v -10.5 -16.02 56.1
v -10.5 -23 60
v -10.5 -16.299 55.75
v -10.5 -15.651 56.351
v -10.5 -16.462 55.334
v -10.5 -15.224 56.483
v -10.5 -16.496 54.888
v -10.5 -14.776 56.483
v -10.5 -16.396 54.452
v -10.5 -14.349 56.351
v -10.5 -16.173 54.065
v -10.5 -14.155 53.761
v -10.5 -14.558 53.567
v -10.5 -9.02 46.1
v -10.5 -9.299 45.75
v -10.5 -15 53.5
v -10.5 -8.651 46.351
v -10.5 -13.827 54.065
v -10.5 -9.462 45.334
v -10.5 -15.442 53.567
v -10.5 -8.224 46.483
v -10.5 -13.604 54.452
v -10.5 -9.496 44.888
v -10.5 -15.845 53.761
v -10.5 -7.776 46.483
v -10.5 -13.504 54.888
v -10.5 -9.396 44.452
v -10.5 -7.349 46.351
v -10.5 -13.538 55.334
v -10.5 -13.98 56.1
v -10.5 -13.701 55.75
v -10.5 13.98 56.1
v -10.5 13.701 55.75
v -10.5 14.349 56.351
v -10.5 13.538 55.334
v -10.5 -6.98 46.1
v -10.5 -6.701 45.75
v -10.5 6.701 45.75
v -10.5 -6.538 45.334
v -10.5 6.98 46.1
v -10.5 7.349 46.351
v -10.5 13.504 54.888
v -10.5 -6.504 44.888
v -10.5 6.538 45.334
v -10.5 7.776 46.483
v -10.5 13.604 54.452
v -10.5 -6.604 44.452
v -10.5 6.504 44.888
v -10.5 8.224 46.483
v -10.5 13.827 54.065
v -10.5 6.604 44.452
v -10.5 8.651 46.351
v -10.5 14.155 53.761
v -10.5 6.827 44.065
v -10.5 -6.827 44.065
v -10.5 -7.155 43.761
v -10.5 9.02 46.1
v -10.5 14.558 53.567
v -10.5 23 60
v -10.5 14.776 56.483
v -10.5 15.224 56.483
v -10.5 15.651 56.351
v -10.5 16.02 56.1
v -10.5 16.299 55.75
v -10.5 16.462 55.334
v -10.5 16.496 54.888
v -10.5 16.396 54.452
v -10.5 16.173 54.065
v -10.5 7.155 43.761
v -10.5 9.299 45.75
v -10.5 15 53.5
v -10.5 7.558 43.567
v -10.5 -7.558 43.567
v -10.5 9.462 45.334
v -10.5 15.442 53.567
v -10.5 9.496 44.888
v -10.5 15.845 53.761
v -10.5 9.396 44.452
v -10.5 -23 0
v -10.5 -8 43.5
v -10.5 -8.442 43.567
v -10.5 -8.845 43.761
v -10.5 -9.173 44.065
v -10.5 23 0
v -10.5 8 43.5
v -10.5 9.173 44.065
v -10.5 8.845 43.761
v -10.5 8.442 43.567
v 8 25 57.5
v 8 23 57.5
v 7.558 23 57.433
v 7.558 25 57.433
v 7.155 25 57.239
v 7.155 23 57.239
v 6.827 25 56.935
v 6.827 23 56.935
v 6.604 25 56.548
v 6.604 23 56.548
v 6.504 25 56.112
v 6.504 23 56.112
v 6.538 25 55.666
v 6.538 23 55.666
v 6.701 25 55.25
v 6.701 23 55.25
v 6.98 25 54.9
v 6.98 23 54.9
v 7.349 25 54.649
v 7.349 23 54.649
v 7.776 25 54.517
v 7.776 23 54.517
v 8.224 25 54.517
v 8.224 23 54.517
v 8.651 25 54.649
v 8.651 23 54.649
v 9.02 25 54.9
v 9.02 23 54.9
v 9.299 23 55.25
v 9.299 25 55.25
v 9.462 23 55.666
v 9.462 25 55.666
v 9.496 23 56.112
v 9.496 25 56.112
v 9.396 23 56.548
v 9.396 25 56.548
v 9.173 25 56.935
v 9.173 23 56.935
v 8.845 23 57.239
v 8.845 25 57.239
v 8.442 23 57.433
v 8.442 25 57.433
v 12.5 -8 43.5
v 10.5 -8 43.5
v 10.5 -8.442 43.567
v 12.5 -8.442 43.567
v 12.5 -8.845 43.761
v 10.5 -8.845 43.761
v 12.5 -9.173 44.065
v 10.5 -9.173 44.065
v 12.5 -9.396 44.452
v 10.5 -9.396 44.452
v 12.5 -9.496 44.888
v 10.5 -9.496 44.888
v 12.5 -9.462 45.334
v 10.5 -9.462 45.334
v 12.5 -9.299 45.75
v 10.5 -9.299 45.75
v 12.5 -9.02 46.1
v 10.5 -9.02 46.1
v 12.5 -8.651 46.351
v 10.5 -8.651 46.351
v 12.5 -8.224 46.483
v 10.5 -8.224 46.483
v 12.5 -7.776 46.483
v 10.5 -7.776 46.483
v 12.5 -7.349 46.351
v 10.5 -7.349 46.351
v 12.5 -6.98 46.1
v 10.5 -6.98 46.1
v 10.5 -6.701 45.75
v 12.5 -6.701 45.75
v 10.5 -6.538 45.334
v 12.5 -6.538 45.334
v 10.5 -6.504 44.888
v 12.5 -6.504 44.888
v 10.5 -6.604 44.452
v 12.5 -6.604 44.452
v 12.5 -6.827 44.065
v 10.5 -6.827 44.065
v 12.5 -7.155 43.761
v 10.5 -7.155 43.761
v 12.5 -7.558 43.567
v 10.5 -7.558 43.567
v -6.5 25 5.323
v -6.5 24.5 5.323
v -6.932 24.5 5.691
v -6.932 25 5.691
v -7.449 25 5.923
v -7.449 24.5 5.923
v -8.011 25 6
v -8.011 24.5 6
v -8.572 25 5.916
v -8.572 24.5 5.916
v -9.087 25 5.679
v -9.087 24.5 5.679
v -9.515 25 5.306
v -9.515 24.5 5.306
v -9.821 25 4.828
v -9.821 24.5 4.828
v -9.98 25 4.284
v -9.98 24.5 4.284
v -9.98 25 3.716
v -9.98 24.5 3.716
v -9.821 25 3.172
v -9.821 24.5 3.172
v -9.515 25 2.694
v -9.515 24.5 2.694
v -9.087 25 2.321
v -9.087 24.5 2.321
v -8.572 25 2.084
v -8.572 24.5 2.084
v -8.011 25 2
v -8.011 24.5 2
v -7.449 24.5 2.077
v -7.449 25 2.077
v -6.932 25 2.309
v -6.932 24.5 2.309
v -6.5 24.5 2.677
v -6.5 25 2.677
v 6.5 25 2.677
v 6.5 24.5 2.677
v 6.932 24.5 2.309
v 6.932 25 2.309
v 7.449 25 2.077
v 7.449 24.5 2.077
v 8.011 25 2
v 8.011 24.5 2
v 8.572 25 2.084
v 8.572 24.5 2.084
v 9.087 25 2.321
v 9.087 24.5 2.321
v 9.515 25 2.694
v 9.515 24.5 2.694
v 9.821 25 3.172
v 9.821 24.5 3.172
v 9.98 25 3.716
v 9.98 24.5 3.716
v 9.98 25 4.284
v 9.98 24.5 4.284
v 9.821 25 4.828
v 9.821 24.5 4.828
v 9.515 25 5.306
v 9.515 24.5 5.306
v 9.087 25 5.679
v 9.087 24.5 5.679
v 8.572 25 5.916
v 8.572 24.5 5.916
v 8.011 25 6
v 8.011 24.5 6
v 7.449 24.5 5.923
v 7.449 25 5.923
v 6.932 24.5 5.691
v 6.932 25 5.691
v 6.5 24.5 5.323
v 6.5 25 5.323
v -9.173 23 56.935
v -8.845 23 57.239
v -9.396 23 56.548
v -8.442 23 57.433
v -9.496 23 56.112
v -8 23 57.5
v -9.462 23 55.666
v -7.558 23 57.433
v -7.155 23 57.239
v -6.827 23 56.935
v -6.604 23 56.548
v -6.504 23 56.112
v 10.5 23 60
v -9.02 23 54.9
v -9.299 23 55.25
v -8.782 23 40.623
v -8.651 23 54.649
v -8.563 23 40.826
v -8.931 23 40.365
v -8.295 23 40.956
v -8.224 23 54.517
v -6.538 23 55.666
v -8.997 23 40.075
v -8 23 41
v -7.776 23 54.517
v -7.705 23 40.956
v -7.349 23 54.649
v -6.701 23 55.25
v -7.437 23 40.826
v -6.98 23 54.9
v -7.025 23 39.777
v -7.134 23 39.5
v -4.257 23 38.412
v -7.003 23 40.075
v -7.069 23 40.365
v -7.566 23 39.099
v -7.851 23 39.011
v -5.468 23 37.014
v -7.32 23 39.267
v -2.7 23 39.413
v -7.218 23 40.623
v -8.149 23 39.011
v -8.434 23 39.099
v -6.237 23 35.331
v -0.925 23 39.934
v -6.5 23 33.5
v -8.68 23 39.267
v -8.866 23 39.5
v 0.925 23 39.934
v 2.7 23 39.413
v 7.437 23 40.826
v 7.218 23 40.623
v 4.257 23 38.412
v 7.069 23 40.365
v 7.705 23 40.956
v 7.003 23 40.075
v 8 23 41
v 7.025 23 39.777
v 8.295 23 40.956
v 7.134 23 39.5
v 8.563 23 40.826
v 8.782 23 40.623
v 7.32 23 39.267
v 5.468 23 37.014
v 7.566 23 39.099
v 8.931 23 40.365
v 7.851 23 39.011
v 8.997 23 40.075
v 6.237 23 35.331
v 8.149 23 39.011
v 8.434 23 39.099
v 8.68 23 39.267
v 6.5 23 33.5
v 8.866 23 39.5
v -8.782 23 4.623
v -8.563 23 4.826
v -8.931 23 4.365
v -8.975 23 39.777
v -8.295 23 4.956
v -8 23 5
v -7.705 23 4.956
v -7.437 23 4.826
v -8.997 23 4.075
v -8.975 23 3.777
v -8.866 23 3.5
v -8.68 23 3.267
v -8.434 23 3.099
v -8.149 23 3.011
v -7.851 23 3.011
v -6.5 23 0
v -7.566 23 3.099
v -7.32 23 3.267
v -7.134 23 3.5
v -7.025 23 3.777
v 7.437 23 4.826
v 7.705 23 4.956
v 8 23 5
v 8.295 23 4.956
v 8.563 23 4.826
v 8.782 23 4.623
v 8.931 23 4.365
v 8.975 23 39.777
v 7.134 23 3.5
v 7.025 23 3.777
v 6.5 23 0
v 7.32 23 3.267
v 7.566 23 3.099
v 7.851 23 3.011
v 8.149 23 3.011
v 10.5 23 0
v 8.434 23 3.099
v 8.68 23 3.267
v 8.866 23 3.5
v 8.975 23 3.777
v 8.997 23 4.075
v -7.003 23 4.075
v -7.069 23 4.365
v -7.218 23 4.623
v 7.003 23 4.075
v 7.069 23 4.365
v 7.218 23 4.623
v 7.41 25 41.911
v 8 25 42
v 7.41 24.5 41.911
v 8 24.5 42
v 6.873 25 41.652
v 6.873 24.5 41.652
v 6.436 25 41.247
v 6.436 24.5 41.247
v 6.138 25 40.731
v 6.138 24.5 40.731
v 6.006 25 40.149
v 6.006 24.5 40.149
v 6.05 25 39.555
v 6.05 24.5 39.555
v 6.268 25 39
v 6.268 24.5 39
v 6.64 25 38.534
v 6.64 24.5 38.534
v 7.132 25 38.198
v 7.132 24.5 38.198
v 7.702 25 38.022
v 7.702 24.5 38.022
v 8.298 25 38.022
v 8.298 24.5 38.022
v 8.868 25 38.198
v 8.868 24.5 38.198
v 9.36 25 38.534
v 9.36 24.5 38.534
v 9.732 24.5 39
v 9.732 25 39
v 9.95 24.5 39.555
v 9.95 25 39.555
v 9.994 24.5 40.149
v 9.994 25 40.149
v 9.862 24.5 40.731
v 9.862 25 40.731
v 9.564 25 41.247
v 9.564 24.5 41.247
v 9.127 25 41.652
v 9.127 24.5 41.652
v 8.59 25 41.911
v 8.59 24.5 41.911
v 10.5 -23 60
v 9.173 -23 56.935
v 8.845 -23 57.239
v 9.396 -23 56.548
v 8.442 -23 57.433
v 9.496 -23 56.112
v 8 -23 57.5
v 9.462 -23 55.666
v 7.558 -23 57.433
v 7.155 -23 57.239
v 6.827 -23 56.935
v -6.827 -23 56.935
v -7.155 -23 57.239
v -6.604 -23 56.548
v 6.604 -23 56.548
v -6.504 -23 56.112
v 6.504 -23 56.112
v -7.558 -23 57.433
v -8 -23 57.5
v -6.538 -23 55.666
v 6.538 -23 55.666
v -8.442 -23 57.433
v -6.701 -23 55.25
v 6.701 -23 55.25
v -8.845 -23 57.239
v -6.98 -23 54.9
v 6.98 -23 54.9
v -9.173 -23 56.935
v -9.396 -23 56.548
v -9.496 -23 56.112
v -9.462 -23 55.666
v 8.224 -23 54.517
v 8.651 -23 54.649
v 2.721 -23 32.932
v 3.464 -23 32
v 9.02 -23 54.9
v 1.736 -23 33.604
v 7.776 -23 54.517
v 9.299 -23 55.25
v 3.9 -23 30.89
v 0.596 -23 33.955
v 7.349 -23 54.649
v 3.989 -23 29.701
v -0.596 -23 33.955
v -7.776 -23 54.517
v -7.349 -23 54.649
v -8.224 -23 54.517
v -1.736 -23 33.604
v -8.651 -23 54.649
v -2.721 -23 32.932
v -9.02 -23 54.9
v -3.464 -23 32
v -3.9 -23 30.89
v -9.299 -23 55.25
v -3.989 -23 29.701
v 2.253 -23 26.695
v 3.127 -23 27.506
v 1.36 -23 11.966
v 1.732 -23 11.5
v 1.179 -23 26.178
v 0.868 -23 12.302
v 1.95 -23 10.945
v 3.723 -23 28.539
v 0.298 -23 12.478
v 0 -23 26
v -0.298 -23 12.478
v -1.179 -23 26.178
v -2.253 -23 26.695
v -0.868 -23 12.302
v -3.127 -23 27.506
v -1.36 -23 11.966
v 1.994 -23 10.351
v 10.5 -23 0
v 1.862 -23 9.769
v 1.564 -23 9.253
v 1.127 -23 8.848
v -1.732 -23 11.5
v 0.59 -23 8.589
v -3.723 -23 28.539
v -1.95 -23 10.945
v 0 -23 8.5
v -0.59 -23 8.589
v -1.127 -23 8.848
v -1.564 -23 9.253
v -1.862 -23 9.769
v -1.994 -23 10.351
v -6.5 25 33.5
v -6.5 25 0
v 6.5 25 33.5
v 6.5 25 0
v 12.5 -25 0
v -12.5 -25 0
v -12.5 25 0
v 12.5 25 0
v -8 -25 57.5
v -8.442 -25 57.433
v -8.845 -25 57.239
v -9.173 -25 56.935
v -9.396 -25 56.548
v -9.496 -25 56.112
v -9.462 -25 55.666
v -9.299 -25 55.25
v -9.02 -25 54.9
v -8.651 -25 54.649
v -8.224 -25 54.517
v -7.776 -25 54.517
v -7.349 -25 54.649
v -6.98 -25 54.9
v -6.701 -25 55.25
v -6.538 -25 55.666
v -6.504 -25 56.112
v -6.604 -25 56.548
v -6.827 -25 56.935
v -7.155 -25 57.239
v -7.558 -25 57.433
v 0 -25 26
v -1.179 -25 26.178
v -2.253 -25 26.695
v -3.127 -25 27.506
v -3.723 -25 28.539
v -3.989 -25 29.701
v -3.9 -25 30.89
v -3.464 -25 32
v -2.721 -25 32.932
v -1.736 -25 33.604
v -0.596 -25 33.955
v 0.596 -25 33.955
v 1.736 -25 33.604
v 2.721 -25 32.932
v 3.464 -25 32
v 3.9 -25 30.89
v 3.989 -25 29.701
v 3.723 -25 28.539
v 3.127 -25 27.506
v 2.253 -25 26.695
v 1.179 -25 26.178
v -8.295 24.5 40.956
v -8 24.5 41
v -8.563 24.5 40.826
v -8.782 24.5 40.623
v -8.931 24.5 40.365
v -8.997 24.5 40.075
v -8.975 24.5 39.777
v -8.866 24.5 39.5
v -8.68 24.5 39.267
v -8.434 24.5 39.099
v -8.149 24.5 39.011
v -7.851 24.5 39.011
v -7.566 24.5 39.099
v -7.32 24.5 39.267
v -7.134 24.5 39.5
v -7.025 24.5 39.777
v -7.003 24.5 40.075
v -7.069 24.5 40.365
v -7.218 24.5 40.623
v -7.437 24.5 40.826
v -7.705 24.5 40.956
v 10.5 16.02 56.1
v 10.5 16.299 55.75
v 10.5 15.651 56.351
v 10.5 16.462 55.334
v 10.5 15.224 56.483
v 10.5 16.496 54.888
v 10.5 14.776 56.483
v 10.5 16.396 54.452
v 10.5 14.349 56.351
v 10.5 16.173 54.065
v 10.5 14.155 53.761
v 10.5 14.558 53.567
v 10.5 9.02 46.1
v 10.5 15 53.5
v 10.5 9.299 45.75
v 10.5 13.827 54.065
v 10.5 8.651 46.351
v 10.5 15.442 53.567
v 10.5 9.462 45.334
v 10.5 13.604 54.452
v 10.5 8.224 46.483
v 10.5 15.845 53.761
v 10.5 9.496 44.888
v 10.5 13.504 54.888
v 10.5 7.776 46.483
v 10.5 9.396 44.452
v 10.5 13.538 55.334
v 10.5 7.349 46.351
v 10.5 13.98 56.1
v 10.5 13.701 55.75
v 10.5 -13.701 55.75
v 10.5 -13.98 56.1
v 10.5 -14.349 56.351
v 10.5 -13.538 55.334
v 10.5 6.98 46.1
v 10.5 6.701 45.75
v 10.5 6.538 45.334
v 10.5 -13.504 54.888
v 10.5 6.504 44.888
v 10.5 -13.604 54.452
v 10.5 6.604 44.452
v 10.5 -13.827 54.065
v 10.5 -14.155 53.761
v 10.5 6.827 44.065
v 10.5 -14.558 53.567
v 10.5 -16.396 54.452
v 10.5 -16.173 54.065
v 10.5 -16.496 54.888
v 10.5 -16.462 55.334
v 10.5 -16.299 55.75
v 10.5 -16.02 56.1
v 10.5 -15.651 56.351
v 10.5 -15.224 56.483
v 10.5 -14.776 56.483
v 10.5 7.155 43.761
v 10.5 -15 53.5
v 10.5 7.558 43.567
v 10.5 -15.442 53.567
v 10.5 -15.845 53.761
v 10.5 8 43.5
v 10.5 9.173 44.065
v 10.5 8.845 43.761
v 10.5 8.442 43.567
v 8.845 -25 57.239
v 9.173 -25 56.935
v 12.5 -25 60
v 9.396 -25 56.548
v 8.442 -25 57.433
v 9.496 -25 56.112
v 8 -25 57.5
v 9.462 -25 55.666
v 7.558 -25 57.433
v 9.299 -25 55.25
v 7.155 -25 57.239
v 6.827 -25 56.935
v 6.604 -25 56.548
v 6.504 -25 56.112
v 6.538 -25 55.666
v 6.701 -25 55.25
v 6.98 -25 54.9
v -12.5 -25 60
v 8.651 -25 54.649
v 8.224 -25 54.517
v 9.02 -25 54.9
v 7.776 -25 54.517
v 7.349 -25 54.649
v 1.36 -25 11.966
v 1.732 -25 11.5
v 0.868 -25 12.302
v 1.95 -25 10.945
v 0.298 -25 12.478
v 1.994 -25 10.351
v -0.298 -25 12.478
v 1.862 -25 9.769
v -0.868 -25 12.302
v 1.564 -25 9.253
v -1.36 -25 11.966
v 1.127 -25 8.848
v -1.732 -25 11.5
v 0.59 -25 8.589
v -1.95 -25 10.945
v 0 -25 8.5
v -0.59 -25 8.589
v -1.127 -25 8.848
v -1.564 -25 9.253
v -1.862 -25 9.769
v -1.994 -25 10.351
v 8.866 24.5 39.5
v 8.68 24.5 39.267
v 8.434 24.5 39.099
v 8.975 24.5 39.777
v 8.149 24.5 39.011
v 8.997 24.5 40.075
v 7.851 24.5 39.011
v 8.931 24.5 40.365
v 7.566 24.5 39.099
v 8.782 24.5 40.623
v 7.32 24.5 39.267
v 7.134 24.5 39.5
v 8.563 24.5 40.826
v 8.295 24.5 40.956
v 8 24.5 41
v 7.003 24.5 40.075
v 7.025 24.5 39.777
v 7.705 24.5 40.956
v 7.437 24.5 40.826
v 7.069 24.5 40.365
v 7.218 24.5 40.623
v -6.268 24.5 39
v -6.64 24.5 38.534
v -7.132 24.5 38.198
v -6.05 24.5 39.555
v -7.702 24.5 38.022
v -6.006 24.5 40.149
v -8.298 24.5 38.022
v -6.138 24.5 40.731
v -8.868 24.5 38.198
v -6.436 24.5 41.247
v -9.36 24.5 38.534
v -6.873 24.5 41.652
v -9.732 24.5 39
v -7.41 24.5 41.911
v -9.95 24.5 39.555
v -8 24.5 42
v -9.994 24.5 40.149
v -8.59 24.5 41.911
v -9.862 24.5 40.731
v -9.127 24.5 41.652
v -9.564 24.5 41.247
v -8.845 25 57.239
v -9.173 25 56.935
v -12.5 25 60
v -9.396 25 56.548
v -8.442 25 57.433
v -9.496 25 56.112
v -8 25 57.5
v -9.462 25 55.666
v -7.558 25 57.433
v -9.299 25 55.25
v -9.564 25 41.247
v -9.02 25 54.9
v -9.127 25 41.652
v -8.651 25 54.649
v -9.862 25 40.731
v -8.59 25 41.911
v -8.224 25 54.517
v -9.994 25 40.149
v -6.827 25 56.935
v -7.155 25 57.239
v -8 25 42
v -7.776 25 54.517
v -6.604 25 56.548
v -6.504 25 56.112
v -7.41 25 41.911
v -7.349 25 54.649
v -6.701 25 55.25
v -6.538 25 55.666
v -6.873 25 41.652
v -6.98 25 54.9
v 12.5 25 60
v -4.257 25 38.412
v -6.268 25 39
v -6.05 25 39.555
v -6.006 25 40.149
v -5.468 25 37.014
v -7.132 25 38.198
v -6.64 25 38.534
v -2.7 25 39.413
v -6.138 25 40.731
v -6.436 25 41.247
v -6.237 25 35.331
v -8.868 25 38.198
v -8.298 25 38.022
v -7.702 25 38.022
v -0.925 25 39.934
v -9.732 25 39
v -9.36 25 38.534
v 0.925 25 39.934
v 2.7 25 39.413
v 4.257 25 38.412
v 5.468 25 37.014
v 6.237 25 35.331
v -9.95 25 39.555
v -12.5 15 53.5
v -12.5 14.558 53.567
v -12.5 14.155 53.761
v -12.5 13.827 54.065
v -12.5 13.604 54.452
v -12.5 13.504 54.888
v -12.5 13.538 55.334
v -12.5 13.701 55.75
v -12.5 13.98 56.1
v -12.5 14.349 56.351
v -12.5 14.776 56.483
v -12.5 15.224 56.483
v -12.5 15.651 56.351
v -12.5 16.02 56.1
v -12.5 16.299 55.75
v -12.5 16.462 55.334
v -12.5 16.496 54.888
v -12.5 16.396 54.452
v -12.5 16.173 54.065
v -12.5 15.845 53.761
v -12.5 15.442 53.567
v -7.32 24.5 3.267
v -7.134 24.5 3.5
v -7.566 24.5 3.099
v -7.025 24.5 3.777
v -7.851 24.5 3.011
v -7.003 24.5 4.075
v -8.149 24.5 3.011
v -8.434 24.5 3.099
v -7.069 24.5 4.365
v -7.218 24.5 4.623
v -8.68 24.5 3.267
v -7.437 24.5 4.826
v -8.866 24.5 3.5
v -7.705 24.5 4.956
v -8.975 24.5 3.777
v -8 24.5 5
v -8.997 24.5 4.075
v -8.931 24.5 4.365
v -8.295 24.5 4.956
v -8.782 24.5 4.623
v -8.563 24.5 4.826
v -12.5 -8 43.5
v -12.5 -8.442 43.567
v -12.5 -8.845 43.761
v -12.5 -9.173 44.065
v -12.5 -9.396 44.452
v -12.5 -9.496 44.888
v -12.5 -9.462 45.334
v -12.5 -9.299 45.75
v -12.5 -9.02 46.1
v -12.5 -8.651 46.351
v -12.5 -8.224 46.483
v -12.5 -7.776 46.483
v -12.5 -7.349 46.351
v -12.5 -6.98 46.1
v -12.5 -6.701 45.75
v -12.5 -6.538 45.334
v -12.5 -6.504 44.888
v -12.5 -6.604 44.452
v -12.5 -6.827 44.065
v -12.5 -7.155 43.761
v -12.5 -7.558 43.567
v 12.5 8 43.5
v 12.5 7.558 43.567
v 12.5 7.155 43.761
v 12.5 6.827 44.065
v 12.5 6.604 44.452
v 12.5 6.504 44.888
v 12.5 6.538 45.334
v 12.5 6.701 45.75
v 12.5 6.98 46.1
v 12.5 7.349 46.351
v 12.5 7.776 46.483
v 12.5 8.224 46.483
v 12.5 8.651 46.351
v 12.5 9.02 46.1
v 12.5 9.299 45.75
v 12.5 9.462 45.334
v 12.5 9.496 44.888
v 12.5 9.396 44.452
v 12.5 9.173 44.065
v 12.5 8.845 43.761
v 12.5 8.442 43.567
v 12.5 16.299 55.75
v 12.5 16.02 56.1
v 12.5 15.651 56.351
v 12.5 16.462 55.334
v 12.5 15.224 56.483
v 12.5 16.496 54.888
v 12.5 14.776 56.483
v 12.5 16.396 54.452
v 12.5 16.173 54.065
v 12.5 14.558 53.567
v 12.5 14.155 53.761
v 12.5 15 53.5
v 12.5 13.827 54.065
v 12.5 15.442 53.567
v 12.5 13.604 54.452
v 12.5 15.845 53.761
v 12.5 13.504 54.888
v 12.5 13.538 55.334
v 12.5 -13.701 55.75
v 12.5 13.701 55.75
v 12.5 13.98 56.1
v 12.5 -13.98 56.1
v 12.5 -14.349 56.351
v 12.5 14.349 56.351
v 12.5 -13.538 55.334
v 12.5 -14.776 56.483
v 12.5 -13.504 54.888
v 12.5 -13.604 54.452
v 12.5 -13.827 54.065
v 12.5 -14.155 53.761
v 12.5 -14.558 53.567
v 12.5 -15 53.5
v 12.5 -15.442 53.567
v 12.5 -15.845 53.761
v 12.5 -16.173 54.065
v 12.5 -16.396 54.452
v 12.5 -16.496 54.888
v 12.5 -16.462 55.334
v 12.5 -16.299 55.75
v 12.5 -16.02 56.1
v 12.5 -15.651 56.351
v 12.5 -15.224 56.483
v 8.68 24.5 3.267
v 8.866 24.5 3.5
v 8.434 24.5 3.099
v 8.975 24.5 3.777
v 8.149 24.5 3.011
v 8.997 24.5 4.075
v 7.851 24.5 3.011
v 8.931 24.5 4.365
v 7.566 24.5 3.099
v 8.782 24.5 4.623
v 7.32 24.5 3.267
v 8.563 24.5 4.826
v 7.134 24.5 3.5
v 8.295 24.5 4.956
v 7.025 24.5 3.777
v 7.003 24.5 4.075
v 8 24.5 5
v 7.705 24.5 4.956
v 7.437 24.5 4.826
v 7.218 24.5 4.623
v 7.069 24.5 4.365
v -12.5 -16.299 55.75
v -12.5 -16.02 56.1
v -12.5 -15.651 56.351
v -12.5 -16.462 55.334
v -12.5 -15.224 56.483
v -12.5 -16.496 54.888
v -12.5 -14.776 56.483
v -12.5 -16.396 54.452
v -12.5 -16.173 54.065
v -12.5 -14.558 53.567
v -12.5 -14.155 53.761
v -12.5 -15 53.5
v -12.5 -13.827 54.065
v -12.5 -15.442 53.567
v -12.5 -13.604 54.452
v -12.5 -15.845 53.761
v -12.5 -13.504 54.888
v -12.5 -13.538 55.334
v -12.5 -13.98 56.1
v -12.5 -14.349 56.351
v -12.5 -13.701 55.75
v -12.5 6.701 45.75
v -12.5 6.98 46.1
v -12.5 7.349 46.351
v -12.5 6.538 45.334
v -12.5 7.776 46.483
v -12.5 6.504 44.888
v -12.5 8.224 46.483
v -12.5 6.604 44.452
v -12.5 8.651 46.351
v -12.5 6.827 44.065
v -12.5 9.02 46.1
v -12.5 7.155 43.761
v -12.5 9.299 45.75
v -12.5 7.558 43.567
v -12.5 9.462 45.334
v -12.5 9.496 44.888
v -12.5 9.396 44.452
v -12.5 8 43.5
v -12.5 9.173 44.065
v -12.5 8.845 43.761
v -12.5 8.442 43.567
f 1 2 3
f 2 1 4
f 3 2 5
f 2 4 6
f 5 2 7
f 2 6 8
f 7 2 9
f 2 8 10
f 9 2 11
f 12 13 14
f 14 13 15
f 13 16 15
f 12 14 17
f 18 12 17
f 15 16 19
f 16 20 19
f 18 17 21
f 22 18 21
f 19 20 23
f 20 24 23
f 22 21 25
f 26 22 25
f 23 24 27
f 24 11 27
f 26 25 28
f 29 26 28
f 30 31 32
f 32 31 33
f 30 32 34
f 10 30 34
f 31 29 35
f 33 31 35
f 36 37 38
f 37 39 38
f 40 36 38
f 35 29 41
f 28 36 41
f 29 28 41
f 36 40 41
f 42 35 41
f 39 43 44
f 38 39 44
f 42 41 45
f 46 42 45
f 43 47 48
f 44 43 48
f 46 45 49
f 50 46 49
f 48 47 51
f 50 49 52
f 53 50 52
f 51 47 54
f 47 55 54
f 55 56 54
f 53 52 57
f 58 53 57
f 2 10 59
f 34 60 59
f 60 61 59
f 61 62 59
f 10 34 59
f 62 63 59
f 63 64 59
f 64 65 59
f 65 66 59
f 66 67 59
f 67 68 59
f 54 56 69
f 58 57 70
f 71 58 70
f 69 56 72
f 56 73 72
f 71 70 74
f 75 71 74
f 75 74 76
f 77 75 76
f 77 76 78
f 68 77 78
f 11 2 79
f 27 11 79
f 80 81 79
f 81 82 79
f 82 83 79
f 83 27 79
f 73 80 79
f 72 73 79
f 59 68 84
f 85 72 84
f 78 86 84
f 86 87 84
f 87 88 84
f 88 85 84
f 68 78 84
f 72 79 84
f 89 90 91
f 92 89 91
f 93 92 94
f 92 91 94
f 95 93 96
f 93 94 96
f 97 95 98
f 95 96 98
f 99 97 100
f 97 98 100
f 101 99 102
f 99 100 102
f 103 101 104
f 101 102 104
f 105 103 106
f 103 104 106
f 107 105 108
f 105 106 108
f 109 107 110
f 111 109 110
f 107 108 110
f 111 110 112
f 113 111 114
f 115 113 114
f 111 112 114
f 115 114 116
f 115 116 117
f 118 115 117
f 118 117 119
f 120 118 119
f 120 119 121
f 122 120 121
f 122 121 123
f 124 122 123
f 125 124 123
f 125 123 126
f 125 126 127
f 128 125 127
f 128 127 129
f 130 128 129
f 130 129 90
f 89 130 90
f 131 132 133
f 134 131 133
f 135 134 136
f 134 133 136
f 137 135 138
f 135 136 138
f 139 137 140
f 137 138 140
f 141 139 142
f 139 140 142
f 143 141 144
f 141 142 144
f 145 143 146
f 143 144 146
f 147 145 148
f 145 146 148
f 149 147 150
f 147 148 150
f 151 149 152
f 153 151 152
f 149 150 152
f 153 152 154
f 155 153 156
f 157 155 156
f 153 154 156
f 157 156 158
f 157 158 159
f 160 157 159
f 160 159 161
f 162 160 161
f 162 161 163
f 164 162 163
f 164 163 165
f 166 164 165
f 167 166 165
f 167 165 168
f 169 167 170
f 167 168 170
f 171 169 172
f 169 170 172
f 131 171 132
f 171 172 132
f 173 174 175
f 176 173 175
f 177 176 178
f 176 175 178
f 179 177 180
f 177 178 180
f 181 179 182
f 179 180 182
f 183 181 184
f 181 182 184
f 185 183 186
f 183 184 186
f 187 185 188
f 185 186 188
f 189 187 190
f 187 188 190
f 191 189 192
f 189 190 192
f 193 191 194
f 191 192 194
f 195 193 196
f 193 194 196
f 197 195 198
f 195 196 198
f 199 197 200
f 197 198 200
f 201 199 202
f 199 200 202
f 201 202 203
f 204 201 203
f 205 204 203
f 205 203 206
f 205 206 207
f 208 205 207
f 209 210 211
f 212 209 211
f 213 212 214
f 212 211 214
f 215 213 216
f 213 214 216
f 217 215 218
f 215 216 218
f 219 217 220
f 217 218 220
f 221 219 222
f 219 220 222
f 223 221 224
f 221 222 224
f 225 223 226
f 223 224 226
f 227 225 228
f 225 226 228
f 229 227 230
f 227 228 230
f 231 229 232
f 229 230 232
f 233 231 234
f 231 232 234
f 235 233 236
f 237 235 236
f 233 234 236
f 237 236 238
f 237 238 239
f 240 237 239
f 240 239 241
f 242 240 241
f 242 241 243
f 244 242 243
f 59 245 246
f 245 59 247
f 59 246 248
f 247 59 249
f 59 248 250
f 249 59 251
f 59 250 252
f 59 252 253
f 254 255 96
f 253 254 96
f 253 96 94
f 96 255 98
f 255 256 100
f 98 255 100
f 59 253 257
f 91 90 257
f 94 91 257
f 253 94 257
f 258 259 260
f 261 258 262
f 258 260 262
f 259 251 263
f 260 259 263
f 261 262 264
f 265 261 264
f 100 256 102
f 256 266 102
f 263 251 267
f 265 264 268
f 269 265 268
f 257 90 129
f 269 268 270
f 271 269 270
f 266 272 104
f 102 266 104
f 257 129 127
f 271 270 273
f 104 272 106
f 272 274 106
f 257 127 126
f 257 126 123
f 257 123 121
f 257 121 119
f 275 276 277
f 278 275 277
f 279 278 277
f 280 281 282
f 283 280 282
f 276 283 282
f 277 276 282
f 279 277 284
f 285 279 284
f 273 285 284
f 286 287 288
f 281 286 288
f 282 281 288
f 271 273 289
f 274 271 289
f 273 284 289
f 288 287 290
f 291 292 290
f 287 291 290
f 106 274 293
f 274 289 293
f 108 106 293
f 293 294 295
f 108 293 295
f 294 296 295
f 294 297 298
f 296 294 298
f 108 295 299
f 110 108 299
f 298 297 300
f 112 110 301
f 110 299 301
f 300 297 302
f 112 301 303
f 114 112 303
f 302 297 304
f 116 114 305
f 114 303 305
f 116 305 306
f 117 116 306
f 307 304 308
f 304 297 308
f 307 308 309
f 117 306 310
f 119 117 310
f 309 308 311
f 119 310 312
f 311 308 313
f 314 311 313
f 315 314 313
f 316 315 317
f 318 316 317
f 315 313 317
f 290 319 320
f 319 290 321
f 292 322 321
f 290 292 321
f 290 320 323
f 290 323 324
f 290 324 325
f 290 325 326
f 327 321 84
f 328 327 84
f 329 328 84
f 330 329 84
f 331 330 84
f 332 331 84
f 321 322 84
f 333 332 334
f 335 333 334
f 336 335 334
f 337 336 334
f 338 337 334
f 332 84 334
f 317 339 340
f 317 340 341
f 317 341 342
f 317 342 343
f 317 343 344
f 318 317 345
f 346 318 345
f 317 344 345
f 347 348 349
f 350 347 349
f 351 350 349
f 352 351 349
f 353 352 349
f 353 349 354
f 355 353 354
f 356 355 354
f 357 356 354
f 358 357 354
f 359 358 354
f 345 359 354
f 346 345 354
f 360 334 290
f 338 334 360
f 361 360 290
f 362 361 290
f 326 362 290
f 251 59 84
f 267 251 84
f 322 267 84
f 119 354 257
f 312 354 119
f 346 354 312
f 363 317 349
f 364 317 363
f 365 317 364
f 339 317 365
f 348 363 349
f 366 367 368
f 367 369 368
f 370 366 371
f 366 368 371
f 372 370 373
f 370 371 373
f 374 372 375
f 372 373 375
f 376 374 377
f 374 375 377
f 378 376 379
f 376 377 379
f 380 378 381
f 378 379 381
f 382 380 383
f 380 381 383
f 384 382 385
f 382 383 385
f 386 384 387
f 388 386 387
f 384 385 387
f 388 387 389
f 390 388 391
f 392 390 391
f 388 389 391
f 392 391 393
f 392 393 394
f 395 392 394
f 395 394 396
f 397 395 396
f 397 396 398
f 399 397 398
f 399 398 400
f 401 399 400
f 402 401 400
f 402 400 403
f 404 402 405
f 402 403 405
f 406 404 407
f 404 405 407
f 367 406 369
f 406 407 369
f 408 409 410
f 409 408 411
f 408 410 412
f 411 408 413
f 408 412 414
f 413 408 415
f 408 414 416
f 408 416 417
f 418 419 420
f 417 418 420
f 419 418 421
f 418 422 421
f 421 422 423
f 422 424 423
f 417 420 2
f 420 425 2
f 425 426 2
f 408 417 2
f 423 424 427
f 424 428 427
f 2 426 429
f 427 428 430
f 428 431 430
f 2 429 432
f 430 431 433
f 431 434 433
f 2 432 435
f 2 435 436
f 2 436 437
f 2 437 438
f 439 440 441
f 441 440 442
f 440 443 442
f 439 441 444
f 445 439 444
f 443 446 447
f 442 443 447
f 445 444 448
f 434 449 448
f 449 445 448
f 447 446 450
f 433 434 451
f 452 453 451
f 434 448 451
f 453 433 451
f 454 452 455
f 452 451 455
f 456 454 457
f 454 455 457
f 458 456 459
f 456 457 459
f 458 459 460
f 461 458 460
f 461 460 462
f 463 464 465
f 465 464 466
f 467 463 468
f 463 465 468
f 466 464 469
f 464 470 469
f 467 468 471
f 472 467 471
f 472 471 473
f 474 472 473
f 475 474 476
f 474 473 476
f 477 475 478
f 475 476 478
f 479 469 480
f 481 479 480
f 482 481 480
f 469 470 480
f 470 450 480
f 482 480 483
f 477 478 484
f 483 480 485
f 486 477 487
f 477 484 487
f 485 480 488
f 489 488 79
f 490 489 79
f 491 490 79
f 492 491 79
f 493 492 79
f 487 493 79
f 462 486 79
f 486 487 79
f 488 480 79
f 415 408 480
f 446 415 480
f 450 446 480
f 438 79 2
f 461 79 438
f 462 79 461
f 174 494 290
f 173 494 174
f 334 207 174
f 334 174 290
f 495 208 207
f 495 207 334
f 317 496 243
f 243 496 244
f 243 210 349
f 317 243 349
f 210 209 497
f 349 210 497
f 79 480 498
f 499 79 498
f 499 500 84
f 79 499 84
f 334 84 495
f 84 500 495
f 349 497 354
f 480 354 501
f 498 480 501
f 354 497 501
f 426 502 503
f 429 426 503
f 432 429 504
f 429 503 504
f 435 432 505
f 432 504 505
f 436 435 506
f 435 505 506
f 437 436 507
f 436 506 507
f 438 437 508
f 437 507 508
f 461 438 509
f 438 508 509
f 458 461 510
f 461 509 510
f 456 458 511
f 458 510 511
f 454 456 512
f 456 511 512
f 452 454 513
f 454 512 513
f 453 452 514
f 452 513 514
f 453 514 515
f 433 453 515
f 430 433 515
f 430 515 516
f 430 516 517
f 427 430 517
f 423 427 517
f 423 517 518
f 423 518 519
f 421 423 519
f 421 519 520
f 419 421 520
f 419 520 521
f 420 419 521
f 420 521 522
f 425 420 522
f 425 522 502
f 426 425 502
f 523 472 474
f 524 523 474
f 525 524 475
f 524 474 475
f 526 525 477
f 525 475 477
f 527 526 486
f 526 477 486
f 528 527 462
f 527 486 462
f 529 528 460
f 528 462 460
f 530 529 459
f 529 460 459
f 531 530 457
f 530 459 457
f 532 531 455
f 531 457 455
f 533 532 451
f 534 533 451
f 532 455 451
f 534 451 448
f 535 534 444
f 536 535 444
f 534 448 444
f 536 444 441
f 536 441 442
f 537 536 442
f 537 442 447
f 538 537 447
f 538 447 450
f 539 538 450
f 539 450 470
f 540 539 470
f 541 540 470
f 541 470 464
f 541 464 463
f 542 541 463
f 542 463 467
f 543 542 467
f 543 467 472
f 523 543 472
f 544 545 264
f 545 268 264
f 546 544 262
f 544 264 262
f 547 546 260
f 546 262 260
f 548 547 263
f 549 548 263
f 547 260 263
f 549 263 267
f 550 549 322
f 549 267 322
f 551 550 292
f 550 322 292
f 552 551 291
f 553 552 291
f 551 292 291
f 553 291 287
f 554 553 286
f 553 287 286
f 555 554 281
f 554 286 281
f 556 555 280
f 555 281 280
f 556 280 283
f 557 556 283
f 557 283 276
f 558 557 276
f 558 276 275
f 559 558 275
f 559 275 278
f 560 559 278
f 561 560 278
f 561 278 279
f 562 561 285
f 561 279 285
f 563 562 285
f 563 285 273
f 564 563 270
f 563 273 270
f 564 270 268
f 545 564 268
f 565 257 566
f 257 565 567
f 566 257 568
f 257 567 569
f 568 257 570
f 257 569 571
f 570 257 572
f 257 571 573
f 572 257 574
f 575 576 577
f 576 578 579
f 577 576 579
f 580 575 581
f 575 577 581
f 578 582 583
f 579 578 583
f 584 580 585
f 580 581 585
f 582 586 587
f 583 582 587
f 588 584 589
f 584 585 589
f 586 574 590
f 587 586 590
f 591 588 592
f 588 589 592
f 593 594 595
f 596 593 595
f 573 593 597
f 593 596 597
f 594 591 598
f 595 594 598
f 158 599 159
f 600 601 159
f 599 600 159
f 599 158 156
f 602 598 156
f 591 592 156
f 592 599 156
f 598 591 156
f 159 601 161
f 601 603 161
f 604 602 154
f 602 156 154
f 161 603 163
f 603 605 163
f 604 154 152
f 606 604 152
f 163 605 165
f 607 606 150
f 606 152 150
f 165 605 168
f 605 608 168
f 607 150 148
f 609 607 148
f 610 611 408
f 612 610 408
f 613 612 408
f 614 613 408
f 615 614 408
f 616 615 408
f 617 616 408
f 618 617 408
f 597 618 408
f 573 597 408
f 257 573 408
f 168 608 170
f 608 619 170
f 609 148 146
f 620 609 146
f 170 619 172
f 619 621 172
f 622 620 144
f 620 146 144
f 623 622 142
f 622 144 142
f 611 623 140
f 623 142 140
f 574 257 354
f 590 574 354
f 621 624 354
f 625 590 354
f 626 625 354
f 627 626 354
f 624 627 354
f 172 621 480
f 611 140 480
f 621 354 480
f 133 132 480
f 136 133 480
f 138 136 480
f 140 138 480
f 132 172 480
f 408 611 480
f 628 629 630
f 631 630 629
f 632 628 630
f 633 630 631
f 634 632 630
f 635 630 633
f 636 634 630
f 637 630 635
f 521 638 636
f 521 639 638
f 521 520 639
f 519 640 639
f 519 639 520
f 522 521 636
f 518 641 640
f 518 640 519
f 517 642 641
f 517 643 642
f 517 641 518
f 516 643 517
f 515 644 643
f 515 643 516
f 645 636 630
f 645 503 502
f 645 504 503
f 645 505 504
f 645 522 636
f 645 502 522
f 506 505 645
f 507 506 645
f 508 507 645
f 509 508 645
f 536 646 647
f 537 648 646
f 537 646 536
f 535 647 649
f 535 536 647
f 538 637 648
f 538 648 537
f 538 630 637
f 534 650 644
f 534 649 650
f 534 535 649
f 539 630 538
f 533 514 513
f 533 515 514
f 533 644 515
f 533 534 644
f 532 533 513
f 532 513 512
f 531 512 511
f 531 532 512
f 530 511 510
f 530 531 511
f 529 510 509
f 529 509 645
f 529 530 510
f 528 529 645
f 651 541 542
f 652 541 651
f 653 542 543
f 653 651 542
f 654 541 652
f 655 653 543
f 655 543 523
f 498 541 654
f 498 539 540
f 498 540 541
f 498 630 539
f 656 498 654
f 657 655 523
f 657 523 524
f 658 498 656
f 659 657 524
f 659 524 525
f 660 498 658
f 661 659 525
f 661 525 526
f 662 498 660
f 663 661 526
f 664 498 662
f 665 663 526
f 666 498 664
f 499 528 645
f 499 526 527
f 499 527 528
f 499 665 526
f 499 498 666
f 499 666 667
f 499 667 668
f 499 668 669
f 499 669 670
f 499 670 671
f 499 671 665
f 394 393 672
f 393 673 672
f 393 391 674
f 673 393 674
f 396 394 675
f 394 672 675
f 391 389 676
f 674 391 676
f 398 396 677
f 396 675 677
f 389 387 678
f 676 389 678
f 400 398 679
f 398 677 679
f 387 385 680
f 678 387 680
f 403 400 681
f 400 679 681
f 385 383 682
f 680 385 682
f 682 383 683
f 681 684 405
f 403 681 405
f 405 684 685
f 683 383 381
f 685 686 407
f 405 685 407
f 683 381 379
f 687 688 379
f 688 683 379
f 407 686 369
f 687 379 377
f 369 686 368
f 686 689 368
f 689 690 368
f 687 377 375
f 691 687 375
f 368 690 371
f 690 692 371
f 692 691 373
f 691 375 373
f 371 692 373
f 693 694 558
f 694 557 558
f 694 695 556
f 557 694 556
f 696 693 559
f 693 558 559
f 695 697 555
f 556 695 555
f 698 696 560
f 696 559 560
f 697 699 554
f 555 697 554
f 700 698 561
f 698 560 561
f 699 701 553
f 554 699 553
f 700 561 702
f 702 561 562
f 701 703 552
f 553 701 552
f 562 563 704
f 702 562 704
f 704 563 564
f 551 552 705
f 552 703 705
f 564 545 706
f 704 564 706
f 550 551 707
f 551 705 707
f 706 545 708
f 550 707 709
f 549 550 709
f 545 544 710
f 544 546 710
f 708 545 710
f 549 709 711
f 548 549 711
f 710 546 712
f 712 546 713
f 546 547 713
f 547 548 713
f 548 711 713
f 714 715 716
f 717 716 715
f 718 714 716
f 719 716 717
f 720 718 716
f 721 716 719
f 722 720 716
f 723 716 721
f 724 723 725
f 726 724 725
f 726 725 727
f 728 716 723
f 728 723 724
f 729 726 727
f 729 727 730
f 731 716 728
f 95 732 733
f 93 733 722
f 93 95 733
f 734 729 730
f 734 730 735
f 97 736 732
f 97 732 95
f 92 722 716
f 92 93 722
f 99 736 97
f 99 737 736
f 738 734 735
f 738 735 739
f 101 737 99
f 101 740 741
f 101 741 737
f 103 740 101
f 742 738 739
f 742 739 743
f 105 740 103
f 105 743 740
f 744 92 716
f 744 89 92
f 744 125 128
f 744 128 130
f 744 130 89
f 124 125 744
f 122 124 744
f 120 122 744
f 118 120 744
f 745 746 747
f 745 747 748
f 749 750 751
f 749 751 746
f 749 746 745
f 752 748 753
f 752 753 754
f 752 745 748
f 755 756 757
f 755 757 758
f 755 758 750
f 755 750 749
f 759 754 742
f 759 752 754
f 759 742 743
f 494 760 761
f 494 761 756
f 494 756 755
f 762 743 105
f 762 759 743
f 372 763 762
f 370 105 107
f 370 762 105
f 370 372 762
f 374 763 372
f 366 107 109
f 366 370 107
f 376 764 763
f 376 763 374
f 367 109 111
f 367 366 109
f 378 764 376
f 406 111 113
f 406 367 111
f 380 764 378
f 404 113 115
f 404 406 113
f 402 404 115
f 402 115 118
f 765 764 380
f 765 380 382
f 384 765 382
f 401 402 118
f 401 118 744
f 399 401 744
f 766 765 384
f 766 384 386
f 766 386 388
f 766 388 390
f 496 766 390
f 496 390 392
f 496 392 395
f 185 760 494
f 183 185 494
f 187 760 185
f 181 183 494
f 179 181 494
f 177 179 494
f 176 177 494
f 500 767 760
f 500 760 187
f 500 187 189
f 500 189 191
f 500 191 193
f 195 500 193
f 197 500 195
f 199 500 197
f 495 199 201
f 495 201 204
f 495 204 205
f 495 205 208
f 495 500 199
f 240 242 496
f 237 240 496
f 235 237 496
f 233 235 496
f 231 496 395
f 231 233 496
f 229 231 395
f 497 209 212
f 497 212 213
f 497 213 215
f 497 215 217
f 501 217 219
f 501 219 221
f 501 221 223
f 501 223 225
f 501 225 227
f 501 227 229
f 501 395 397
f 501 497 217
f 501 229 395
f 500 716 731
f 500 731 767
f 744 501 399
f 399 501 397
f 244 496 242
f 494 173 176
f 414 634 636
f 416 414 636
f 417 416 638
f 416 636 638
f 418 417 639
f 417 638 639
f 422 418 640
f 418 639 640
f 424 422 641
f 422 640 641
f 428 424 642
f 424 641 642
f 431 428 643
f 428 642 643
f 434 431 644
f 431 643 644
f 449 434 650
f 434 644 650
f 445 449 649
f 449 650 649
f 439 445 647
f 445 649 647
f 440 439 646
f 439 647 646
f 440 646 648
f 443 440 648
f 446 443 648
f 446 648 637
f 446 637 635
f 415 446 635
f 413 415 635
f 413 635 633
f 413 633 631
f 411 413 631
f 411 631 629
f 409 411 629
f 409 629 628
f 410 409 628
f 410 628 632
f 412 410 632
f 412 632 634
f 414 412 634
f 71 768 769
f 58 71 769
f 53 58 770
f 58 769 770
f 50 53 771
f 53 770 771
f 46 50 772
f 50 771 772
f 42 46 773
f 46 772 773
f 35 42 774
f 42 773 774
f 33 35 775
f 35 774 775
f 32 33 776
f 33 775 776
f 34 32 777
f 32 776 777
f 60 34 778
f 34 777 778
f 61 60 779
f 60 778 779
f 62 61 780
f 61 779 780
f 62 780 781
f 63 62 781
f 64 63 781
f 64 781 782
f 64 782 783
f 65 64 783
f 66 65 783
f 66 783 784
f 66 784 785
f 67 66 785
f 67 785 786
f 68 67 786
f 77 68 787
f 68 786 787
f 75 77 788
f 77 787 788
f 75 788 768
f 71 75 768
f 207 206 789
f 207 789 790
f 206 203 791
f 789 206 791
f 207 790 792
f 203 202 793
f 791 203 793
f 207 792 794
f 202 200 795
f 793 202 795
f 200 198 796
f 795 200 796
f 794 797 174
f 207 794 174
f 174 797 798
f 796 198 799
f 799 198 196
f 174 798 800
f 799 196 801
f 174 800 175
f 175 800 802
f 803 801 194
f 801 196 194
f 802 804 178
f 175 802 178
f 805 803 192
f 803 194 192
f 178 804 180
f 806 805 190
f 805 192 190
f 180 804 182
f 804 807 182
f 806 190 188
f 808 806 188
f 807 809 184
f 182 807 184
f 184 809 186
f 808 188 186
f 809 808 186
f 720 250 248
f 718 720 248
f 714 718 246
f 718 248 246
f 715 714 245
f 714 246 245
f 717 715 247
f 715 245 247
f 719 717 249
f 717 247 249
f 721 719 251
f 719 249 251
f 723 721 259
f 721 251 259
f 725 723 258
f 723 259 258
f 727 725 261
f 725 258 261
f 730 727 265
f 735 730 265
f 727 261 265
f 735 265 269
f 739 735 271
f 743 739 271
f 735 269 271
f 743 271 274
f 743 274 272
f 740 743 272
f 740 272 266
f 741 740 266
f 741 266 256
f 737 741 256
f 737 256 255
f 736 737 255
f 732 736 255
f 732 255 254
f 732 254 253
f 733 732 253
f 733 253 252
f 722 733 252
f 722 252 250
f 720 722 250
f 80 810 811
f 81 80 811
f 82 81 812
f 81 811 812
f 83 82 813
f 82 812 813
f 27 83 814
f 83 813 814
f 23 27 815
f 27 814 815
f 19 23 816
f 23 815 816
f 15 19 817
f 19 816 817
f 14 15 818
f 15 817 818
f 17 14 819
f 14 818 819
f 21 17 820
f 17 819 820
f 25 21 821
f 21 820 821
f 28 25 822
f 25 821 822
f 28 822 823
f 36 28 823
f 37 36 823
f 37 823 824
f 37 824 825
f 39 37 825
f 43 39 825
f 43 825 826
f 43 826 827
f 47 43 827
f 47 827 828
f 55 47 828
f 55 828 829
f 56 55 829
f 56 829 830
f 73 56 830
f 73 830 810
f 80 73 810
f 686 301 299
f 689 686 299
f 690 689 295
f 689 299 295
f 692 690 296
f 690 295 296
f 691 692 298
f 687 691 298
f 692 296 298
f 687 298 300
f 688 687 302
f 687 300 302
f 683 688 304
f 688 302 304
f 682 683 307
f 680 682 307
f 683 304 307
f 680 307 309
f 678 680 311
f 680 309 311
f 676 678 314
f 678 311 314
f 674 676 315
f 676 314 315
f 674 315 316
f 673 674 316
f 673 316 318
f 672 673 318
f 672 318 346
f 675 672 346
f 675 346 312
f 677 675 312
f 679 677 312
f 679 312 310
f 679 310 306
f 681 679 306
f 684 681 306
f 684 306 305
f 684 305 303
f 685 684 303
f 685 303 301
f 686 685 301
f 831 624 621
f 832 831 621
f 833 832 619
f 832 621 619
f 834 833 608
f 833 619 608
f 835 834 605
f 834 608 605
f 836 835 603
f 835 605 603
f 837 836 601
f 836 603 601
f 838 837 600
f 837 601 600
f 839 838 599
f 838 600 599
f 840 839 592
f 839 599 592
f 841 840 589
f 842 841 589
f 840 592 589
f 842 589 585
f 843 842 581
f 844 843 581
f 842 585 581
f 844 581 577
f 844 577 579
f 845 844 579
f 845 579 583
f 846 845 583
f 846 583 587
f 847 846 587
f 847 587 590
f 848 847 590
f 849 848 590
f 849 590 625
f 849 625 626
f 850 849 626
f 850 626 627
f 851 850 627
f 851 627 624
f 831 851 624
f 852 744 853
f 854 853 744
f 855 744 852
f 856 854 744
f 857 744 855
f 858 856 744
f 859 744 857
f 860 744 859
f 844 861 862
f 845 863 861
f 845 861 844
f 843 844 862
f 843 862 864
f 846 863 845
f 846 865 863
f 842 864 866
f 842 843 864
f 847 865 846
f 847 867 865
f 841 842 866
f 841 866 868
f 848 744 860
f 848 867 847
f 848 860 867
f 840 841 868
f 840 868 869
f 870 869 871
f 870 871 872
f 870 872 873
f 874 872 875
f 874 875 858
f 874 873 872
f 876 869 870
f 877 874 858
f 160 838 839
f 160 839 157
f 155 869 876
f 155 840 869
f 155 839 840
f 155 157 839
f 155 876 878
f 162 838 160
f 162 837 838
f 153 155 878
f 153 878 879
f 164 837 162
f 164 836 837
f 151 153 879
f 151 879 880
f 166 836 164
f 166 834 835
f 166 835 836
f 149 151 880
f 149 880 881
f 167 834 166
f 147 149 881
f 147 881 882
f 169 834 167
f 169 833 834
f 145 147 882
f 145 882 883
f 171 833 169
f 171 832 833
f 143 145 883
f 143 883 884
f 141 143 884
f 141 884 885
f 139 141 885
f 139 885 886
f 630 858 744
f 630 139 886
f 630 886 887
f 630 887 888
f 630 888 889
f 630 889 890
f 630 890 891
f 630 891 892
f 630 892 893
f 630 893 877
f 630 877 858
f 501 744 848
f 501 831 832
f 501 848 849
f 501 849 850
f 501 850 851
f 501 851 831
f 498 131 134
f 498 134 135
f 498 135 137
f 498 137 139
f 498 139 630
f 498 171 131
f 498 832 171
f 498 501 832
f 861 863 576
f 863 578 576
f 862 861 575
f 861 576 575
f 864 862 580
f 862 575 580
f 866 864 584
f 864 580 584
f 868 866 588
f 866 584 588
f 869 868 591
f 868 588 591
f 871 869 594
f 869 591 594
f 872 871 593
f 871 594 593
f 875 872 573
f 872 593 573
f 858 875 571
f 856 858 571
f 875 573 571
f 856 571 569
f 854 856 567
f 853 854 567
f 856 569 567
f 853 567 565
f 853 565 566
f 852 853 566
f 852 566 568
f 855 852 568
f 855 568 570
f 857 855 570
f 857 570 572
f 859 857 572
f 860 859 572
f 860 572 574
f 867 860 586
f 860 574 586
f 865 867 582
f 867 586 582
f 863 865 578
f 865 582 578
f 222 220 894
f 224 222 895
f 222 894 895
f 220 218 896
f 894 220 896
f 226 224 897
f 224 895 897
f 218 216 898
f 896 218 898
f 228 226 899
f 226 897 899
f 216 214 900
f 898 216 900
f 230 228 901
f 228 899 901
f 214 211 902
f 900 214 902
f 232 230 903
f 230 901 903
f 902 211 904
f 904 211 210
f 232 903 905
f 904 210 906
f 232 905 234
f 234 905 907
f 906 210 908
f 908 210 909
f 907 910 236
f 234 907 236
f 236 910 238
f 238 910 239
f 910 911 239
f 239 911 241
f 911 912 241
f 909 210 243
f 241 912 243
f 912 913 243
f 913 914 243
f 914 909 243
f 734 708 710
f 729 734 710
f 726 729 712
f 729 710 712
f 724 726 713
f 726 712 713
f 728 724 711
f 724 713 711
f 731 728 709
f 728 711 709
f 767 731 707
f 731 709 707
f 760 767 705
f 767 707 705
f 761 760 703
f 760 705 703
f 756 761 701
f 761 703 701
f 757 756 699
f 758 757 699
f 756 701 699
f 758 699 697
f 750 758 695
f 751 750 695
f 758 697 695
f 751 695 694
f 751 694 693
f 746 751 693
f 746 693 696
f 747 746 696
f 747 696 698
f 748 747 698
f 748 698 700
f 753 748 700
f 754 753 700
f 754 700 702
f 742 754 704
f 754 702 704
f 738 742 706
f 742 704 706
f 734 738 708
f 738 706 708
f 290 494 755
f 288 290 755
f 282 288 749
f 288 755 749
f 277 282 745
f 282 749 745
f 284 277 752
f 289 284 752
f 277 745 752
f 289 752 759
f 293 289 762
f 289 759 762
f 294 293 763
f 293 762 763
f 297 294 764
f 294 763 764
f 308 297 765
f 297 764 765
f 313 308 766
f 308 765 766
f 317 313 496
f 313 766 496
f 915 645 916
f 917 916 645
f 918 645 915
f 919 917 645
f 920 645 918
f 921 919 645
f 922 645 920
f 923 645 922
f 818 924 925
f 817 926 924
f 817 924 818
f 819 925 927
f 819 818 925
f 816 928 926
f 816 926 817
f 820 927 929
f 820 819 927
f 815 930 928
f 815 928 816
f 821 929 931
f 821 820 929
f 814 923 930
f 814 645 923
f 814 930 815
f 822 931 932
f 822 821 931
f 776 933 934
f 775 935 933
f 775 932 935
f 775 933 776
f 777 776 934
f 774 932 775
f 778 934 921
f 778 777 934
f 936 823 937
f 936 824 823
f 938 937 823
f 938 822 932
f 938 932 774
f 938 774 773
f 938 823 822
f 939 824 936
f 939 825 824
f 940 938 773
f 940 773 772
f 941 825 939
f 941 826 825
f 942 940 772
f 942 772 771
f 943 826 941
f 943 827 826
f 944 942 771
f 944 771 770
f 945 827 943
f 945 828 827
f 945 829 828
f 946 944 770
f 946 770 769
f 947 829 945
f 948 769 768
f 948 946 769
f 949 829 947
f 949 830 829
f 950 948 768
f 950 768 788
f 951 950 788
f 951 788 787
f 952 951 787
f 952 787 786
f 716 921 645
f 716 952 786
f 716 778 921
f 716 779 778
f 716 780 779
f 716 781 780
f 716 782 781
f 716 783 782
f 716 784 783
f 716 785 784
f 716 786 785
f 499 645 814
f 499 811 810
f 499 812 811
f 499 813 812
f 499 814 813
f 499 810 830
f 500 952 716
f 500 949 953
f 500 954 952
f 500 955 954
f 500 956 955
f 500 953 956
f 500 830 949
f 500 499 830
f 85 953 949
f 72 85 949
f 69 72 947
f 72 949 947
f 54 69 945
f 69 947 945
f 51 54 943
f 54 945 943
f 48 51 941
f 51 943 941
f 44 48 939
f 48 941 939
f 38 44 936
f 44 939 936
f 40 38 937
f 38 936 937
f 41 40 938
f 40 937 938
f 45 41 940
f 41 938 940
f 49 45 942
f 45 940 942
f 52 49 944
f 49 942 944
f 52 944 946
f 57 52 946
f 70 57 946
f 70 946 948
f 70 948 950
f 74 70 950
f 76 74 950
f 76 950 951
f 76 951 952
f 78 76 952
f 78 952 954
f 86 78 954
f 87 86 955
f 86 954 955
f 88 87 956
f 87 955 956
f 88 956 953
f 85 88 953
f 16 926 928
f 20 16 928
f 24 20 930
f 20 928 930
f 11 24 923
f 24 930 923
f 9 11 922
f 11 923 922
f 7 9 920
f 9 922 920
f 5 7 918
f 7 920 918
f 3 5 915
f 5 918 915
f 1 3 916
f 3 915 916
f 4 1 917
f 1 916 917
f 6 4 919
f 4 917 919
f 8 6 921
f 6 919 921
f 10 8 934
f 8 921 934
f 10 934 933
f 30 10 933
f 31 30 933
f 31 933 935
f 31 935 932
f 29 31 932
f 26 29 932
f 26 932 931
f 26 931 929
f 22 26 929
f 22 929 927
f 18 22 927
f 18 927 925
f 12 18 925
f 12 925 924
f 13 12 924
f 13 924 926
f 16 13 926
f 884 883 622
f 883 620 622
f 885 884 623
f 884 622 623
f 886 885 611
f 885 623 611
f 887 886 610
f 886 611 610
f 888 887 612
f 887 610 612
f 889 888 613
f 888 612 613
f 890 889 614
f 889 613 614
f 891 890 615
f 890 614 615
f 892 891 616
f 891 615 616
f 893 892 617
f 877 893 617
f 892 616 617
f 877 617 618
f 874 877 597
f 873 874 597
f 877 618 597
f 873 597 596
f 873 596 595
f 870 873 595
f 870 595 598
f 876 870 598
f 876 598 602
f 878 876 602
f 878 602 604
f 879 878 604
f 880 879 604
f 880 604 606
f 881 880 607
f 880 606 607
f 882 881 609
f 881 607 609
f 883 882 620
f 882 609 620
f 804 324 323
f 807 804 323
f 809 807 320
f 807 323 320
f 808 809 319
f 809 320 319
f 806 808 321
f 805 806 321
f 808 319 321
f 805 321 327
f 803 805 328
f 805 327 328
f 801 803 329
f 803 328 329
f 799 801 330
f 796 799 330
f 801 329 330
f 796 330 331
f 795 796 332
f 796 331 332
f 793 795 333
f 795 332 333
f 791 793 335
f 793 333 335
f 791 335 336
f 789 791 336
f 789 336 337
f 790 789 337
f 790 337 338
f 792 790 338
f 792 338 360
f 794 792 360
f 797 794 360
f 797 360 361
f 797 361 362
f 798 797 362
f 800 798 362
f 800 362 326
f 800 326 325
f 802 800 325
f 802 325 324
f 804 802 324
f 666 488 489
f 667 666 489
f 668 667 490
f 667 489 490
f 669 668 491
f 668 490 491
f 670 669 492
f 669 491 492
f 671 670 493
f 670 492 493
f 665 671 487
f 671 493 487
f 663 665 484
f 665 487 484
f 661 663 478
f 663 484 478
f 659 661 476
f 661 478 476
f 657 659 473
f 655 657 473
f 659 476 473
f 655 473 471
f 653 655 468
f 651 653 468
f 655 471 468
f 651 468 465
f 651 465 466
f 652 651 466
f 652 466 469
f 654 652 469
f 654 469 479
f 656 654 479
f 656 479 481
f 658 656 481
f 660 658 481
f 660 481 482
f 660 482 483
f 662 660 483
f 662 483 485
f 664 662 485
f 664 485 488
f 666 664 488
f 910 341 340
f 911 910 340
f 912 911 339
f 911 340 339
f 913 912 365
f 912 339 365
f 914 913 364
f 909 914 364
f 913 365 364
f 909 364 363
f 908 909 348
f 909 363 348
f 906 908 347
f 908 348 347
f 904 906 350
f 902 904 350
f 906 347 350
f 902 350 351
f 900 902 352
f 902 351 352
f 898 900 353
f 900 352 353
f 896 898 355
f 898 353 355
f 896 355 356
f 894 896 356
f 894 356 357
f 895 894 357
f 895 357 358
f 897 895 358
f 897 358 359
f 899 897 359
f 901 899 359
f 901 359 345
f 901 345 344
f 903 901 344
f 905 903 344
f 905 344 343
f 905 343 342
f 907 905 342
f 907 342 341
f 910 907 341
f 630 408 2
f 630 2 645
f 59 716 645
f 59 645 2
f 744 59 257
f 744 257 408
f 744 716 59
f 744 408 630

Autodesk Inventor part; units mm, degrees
ref_plane "YZ Plane" through (0, 0, 0) normal (1, 0, 0) x (0, 1, 0)
ref_plane "XZ Plane" through (0, 0, 0) normal (0, 1, 0) x (-1, 0, 0)
ref_plane "XY Plane" through (0, 0, 0) normal (0, 0, 1) x (1, 0, 0)
sketch "スケッチ1" plane through (0, 0, 0) normal (0, 0, 1) x (1, 0, 0)
  line L0 (-12.5, 25) -> (12.5, 25)
  line L1 (12.5, 25) -> (12.5, -25)
  line L2 (12.5, -25) -> (-12.5, -25)
  line L3 (-12.5, -25) -> (-12.5, 25)
  line L4 (-10.5, 23) -> (10.5, 23)
  line L5 (10.5, 23) -> (10.5, -23)
  line L6 (10.5, -23) -> (-10.5, -23)
  line L7 (-10.5, -23) -> (-10.5, 23)
  point P0 (0, 0)
  dimension "d0" = 25
  dimension "d1" = 50
  dimension "d2" = 46
  dimension "d3" = 21
  dimension "d4" = 25
  dimension "d5" = 23
  dimension "d6" = 10.5
  dimension "d7" = 12.5
extrude "押し出し1" add sketch "スケッチ1" along normal blind 60
sketch "スケッチ2" plane through (-12.5, 25, 0) normal (0, 1, 0) x (1, 0, 0)
  line L0 (0, 0) -> (25, 0) projected
  line L1 (0, 0) -> (0, -60) projected
  arc A0 (6, -33.5) -> (19, -33.5) centre (12.5, -33.5) ccw
  line L2 (6, -33.5) -> (6, 0)
  line L3 (19, -33.5) -> (19, 0)
  point P0 (12.5, 0)
  dimension "d10" = 13
  dimension "d11" = 33.5
  dimension "d12" = 12.5
extrude "押し出し2" cut sketch "スケッチ2" against normal blind 2
sketch "スケッチ3" plane through (-12.5, 25, 60) normal (0, 1, 0) x (1, 0, 0)
  arc A0 (6, 26.5) -> (19, 26.5) centre (12.5, 26.5) ccw projected
  circle A1 centre (4.5, 20) radius 1
  circle A2 centre (4.5, 56) radius 1
  circle A3 centre (20.5, 56) radius 1
  circle A4 centre (20.5, 20) radius 1
  point P0 (12.5, 60)
  dimension "d15" = 6.5
  dimension "d16" = 6.5
  dimension "d17" = 2
  dimension "d18" = 8
  dimension "d19" = 8
  dimension "d20" = 8
  dimension "d21" = 8
  dimension "d22" = 29.5
  dimension "d23" = 29.5
hole "穴1" at (-8, 25, 4) at (8, 25, 4) at (8, 25, 40) at (-8, 25, 40) direction (0, -1, 0) diameter 2 depth 2 tip angle 118 counterbore diameter 4 counterbore depth 0.5
sketch "スケッチ4" plane through (-12.5, -25, 0) normal (0, -1, 0) x (1, 0, 0)
  line L0 (25, 0) -> (0, 0) projected
  line L1 (25, 0) -> (25, 60) projected
  circle A0 centre (12.5, 10.5) radius 2
  point P0 (12.5, 0)
  dimension "d31" = 4
  dimension "d32" = 12.5
  dimension "d33" = 10.5
hole "穴2" at (0, -25, 10.5) direction (0, 1, 0) diameter 4 end through all
sketch "スケッチ5" plane through (-12.5, 25, 60) normal (0, 1, 0) x (1, 0, 0)
  arc A0 (6, 26.5) -> (19, 26.5) centre (12.5, 26.5) ccw projected
  circle A1 centre (20.5, 4) radius 1.5
  circle A2 centre (4.5, 4) radius 1.5
  circle A3 centre (20.5, 20) radius 2 projected
  circle A4 centre (4.5, 20) radius 2 projected
  point P0 (12.5, 60)
  dimension "d46" = 8
  dimension "d47" = 8
  dimension "d57" = 3
  dimension "d120" = 16
  dimension "d121" = 16
hole "穴4" at (-8, 25, 56) at (8, 25, 56) direction (0, -1, 0) diameter 3 end through all
thread "ねじ1" size "M3x0.5" class "6H" standard "ANSI Metric M Profile" full length
thread "ねじ2" size "M3x0.5" class "6H" standard "ANSI Metric M Profile" full length
thread "ねじ3" size "M3x0.5" class "6H" standard "ANSI Metric M Profile" full length
thread "ねじ4" size "M3x0.5" class "6H" standard "ANSI Metric M Profile" full length
sketch "スケッチ7" plane through (-12.5, -25, 0) normal (0, -1, 0) x (1, 0, 0)
  line L0 (25, 0) -> (25, 60) projected
  circle A0 centre (12.5, 30) radius 4
  circle A1 centre (4.5, 56) radius 1.5 projected
  circle A2 centre (12.5, 10.5) radius 2 projected
  point P0 (12.5, 0)
  dimension "d79" = 8
  dimension "d80" = 12.5
  dimension "d118" = 19.5
  dimension "d119" = 26
hole "穴5" at (0, -25, 30) direction (0, 1, 0) diameter 8 end through all
sketch "スケッチ8" plane through (12.5, -25, 0) normal (1, 0, 0) x (0, 0, -1)
  line L0 (-60, 50) -> (-60, 0) projected
  line L1 (0, 0) -> (-60, 0) projected
  circle A0 centre (-45, 33) radius 1.5
  circle A1 centre (-45, 17) radius 1.5
  circle A2 centre (-55, 40) radius 1.5
  circle A3 centre (-55, 10) radius 1.5
  line L2 (0, 50) -> (-60, 50) projected
  line L3 (0, 50) -> (0, 0) projected
  point P0 (0, 25)
  dimension "d88" = 16
  dimension "d90" = 3
  dimension "d91" = 15
  dimension "d93" = 17
  dimension "d101" = 30
  dimension "d113" = 10
  dimension "d114" = 15
  dimension "d115" = 5
  dimension "d116" = 5
  dimension "d117" = 60
hole "穴7" at (12.5, 8, 45) at (12.5, -8, 45) at (12.5, -15, 55) at (12.5, 15, 55) direction (-1, 0, 0) diameter 3 end through all
properties part number "07" material "アルミニウム 6061"
